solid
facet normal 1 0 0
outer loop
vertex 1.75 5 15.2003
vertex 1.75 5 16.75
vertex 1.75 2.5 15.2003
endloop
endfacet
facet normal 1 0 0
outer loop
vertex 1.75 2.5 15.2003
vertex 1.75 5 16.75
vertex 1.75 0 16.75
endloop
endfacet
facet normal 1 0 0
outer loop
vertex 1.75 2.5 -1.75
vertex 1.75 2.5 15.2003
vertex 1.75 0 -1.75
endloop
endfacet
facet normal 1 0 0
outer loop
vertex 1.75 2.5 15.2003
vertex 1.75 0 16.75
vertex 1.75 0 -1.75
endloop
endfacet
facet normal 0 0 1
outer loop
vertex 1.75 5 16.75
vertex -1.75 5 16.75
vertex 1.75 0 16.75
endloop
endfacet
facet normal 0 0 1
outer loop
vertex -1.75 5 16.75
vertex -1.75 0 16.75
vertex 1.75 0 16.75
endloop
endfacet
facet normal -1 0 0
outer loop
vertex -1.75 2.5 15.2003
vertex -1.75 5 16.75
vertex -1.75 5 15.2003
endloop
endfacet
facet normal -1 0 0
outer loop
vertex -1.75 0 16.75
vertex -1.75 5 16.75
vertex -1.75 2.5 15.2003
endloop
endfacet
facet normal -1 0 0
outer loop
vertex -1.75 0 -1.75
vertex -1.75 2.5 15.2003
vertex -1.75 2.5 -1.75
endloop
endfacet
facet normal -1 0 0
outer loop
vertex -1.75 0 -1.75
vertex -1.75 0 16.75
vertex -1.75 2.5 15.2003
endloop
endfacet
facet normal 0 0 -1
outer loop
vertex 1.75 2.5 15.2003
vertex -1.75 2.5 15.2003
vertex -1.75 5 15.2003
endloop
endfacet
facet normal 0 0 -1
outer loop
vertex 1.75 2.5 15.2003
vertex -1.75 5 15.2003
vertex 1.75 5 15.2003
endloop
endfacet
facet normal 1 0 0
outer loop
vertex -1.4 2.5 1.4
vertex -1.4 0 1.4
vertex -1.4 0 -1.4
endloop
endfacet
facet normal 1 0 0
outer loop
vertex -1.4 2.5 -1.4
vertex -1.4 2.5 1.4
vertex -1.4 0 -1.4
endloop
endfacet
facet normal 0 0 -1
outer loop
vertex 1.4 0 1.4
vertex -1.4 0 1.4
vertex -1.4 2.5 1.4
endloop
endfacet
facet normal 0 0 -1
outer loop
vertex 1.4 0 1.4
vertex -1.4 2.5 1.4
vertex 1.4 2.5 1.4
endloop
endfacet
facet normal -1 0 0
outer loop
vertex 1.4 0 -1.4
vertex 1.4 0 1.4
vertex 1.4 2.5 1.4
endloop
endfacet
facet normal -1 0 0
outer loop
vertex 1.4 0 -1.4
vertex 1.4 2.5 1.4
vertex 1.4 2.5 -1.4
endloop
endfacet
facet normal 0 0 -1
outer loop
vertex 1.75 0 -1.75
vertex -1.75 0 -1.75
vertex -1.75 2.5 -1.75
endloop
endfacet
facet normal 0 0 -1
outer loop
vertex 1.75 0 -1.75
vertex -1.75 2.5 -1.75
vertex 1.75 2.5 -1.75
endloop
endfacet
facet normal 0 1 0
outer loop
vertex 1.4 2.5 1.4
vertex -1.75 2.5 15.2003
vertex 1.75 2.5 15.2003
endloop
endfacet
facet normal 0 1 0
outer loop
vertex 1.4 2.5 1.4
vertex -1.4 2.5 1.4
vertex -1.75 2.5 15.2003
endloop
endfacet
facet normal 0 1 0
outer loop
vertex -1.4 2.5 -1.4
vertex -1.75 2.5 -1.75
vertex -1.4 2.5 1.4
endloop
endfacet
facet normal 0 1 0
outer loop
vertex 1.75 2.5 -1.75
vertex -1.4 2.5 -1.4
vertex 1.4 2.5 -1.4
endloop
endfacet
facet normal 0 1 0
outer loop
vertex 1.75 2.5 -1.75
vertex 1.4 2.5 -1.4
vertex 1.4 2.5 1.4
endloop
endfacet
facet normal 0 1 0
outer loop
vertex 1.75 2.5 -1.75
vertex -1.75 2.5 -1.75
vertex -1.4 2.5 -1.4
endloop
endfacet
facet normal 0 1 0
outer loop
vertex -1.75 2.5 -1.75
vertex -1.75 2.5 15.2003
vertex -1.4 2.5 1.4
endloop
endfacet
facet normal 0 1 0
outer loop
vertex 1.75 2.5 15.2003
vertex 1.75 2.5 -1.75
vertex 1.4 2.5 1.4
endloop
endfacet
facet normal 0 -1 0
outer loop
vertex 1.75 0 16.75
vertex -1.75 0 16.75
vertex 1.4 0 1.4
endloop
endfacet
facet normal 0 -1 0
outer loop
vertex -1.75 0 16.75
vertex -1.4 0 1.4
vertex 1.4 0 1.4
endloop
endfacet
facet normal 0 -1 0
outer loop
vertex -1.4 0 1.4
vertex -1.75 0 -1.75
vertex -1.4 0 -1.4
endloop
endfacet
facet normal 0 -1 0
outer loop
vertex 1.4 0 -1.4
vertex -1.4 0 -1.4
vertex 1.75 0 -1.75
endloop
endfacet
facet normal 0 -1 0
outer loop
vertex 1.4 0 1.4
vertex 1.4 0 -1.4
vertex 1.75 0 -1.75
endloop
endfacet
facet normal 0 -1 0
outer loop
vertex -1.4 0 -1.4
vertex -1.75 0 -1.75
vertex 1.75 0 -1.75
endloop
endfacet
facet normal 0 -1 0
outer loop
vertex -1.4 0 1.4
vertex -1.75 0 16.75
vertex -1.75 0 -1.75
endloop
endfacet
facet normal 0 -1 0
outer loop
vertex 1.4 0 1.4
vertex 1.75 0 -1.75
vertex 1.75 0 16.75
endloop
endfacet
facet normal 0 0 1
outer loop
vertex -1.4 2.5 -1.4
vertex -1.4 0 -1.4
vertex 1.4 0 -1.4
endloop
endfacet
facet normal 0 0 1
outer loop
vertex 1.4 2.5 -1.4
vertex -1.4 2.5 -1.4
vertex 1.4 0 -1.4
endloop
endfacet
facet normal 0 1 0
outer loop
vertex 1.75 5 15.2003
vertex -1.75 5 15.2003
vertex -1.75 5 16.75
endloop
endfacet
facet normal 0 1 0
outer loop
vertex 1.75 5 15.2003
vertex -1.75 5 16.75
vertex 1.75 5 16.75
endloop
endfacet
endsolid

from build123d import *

# Parameters (mm, degrees)
SKETCH1_W           = 3.5
SKETCH1_H           = 18.5
SKETCH1_W_2         = 2.8
SKETCH1_H_2         = 2.8
BOSS_EXTRUDE1_DEPTH = 2.5
SKETCH4_W           = 3.5
SKETCH4_H           = 1.549747226
BOSS_EXTRUDE2_DEPTH = 2.5


with BuildPart() as part:
    # Sketch1 → Boss-Extrude1 (new body)
    with BuildSketch(Plane(origin=(0, 0, 0), x_dir=(1, 0, 0), z_dir=(0, 1, 0))):
        with Locations((0, -7.5)):
            Rectangle(SKETCH1_W, SKETCH1_H)
        Rectangle(SKETCH1_W_2, SKETCH1_H_2, mode=Mode.SUBTRACT)
    extrude(amount=BOSS_EXTRUDE1_DEPTH)

    # Sketch4 → Boss-Extrude2 (add)
    with BuildSketch(Plane(origin=(0, 2.5, 0), x_dir=(1, 0, 0), z_dir=(0, 1, 0))):
        with Locations((0, -15.975126387)):
            Rectangle(SKETCH4_W, SKETCH4_H)
    extrude(amount=BOSS_EXTRUDE2_DEPTH)


solid = part.part
